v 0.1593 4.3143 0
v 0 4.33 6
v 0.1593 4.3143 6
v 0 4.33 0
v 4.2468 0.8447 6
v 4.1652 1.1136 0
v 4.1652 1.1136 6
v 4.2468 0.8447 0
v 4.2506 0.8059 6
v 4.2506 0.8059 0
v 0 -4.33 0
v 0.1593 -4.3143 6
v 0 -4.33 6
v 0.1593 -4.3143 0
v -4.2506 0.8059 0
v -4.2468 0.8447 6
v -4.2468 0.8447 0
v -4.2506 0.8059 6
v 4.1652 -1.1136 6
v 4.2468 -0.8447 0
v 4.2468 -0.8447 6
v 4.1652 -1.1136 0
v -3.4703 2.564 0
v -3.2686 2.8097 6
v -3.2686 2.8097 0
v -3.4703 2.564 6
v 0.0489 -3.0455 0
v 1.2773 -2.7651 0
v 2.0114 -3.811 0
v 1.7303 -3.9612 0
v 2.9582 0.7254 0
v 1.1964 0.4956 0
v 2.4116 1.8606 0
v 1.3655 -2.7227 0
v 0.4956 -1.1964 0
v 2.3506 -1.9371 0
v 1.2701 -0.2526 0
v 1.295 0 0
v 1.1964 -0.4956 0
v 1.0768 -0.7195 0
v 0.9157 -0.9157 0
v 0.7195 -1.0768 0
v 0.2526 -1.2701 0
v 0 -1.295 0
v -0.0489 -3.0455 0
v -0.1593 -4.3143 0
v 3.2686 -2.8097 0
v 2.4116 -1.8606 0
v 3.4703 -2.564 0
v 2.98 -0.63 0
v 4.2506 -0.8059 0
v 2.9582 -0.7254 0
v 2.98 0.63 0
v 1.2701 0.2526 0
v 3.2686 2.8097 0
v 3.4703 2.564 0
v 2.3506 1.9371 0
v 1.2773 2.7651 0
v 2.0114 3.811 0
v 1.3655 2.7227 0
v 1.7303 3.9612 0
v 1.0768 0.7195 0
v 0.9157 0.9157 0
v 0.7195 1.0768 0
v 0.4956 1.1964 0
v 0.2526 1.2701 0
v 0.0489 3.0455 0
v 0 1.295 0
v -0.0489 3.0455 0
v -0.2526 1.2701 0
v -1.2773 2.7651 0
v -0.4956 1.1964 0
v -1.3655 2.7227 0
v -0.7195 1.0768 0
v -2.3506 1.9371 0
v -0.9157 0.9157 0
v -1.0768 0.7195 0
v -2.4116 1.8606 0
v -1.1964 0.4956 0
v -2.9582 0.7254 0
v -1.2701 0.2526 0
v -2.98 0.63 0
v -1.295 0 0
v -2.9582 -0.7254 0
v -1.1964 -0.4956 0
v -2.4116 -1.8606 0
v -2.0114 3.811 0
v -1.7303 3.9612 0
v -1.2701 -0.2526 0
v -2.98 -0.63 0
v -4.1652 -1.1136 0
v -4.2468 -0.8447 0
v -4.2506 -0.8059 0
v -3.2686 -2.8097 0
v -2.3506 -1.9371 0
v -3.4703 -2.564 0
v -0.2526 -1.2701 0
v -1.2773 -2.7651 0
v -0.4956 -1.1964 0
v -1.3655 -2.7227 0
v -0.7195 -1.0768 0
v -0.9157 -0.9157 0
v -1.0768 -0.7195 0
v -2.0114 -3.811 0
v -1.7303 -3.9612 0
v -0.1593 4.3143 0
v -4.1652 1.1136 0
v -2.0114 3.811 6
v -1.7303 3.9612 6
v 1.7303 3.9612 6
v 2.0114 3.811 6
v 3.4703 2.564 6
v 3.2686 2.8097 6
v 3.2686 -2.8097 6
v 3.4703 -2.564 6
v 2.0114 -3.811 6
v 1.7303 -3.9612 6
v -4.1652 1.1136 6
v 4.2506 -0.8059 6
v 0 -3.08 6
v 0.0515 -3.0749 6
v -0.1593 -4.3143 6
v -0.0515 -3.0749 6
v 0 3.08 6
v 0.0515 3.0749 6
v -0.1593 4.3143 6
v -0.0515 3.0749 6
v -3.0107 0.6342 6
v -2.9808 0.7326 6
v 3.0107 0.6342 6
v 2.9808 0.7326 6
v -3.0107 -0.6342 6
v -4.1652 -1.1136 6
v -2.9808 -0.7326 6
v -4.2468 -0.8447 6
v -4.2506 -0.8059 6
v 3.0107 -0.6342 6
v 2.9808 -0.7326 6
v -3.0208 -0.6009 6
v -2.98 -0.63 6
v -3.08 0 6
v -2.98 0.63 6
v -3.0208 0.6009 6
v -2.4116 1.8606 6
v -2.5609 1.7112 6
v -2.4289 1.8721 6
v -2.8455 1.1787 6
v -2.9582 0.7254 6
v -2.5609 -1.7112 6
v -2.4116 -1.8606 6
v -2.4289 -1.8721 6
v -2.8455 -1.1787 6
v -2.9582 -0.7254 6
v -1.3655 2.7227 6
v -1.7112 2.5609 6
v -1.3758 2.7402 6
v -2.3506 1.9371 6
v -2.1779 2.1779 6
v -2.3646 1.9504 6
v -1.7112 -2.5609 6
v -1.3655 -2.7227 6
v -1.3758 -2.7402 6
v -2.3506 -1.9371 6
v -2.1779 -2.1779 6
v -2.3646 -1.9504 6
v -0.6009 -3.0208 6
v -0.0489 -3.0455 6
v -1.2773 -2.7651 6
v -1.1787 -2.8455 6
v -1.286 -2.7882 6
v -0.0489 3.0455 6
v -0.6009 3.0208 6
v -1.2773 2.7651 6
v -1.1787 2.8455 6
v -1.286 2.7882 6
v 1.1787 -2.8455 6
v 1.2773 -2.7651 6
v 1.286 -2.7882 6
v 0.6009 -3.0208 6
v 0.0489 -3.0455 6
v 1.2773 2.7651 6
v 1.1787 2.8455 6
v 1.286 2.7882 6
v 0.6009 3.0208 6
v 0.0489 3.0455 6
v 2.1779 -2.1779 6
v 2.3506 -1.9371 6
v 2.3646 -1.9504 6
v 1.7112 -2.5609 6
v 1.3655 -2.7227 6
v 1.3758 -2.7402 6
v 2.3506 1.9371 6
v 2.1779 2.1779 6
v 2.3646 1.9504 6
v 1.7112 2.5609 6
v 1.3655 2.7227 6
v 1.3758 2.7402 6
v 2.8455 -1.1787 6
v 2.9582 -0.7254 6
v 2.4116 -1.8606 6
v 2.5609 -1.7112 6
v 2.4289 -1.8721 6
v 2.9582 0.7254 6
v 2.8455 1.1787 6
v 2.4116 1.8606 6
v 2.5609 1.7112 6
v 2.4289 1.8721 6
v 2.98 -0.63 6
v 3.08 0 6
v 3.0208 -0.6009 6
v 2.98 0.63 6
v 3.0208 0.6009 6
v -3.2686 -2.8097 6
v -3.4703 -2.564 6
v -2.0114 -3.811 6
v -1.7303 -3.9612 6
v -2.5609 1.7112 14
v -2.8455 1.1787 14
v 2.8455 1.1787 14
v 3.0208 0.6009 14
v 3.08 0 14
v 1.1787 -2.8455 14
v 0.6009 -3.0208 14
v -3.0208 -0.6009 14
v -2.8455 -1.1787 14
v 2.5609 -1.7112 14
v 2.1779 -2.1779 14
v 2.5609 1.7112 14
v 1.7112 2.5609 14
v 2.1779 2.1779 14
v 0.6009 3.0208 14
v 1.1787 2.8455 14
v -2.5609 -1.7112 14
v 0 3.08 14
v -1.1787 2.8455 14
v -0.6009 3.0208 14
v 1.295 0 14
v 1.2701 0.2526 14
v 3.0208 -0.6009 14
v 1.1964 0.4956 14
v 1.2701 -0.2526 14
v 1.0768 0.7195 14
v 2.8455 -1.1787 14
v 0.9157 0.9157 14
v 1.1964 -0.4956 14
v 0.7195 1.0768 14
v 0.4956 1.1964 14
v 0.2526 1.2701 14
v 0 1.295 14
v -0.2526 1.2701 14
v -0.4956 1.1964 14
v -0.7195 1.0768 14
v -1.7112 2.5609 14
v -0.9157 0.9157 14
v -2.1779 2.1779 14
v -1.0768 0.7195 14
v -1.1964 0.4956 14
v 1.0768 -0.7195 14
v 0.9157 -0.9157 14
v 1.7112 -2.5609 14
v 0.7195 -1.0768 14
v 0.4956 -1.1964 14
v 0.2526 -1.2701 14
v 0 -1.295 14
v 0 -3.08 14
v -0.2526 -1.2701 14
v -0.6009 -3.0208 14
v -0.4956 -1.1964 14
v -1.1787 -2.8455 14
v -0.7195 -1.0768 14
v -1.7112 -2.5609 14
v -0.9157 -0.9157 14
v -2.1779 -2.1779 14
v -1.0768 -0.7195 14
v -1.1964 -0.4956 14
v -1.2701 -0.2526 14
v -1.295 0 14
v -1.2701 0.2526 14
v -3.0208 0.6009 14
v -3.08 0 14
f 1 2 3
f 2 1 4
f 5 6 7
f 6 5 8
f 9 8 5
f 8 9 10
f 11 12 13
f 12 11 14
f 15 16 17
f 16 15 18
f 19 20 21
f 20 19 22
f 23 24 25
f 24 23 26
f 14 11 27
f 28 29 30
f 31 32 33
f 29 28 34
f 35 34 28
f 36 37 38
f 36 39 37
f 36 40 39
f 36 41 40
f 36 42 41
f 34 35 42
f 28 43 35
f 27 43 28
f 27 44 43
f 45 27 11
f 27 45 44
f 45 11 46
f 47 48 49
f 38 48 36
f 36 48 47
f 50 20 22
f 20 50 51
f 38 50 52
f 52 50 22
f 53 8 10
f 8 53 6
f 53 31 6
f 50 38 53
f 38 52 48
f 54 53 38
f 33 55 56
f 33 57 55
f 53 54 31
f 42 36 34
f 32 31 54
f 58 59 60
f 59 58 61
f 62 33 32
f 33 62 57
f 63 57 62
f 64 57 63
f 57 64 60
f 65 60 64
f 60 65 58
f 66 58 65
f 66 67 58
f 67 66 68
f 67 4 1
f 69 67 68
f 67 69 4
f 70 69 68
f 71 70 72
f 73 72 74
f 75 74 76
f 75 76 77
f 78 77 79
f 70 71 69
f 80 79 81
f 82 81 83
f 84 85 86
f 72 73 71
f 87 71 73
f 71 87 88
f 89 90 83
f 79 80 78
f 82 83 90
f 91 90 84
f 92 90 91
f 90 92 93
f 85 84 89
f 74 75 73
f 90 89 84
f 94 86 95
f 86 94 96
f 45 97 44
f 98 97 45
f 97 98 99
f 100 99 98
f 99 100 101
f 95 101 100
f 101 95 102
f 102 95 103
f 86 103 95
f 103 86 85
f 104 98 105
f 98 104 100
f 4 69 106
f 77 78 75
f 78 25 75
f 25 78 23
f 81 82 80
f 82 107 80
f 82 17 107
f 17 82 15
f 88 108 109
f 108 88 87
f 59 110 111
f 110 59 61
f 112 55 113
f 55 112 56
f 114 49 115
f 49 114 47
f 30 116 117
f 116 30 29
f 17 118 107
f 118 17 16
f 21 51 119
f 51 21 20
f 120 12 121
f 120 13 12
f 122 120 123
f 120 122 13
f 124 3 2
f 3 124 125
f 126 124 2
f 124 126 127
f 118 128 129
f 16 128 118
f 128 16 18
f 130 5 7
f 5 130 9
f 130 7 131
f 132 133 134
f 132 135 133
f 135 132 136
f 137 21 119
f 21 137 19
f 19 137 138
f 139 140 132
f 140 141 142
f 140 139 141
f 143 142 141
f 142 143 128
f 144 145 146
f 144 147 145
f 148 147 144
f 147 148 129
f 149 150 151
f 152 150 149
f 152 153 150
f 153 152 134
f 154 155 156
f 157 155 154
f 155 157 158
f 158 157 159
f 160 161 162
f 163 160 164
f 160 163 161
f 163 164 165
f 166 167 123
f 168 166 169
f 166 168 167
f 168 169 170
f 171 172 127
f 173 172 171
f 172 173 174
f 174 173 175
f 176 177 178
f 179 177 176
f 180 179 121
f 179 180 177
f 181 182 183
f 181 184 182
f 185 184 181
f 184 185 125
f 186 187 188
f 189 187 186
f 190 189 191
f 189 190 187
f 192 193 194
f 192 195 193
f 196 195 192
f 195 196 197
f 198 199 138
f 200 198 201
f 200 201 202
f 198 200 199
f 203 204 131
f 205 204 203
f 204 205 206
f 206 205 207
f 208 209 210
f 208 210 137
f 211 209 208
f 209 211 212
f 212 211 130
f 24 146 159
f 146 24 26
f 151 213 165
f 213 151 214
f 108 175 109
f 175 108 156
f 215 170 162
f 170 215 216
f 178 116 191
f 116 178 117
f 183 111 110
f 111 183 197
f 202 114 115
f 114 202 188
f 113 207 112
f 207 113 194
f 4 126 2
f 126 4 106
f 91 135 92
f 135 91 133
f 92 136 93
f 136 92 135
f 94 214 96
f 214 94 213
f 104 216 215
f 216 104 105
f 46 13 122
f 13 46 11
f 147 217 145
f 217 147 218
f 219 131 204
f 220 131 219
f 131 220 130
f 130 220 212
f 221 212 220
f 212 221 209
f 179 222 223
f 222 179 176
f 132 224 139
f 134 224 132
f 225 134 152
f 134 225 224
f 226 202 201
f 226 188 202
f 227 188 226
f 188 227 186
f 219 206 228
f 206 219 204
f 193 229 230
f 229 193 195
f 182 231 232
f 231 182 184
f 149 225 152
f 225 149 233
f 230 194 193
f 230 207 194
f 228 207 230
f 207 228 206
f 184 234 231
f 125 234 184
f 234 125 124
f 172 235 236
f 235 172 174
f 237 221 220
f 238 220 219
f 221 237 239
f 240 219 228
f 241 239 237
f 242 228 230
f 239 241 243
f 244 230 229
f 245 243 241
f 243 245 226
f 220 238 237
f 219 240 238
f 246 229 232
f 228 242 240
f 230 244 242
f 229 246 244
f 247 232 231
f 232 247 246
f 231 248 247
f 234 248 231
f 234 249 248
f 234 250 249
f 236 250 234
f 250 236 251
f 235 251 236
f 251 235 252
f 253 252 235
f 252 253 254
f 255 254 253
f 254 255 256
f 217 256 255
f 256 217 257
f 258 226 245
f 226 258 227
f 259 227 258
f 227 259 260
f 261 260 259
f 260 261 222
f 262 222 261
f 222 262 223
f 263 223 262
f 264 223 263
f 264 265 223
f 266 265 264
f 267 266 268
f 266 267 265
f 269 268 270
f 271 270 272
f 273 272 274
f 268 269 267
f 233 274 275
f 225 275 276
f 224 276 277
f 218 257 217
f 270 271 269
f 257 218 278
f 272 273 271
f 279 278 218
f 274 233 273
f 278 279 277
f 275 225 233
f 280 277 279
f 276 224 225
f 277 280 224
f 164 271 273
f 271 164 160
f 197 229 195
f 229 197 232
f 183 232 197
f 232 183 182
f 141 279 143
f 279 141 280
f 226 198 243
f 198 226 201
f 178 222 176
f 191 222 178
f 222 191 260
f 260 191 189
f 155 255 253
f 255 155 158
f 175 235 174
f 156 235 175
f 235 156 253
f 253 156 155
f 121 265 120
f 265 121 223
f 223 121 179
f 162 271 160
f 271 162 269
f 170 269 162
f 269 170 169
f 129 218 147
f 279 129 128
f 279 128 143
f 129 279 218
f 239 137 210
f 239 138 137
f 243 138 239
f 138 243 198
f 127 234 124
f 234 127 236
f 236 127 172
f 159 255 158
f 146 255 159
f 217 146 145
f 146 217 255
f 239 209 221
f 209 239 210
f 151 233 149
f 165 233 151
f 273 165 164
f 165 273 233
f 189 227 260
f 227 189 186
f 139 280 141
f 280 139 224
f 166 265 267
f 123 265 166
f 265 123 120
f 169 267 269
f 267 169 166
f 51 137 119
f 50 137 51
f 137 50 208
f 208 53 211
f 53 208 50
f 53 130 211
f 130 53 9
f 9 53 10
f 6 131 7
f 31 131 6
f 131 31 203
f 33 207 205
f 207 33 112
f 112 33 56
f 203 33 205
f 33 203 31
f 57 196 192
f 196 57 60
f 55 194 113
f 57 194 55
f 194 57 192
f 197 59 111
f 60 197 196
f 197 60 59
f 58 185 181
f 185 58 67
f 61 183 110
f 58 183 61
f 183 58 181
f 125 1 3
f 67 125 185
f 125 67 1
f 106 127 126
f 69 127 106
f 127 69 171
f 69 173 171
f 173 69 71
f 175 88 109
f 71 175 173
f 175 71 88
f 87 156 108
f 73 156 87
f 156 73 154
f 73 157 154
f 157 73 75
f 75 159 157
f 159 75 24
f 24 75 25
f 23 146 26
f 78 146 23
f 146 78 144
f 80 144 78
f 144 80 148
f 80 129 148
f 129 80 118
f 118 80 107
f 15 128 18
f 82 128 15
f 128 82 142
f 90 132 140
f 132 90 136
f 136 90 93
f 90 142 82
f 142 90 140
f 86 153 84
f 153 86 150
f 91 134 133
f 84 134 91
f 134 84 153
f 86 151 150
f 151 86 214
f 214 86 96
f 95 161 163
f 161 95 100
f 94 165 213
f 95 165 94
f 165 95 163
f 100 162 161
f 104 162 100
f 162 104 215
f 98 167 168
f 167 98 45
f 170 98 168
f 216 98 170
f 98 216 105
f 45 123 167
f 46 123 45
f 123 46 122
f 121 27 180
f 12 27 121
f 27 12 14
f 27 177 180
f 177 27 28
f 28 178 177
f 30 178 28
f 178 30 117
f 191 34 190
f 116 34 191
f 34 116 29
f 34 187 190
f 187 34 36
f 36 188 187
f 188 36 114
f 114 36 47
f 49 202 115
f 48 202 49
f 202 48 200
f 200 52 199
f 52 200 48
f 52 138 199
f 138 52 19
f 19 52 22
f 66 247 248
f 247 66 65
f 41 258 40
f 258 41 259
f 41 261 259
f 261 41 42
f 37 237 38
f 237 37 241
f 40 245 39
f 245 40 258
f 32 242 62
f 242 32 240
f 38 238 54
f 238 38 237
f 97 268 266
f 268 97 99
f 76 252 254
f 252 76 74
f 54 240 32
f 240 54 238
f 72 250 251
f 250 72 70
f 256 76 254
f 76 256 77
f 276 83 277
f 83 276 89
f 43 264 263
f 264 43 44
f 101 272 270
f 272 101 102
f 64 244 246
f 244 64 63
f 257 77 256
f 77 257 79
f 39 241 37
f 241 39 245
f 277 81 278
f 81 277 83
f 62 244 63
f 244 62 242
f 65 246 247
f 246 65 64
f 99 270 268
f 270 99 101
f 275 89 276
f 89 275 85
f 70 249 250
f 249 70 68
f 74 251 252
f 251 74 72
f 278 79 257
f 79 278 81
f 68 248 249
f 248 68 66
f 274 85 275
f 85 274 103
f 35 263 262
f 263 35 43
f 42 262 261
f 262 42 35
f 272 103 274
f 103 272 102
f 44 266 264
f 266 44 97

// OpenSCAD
$fn = 32;

// ----------------------------------------------------------------------
// Timing pulley: GT2 14T, pitch 2 mm, 8.66 mm x 14 mm
// ----------------------------------------------------------------------

// --- parameters (mm) ---
pitch = 2;                // belt pitch
teeth = 14;               // number of grooves
belt_w = 6;               // belt width between the flanges
tip_d = 8.66;             // tip circle diameter
root_d = 7.16;            // groove bottom diameter
groove_h = 0.75;          // groove depth
tooth_w = 1.5;            // groove width at the tip circle
bore_d = 2.59;            // shaft bore
hub_d = 6.16;             // hub diameter
hub_h = 8;                // hub above the flange
bottom_z = 0;             // lowest point of the pulley
top_z = 14;               // highest point of the pulley

module rim() {
  cylinder(h = belt_w, d = tip_d);
}

module groove_cutter() {
  /* belt tooth groove: deeper than wide, cut through the belt width */
  translate([root_d / 2, 0, 0])
    linear_extrude(height = belt_w)
      polygon(points = [[-0.6, -tooth_w * 0.42], [groove_h + 0.6, -tooth_w * 0.6],
                        [groove_h + 0.6, tooth_w * 0.6], [-0.6, tooth_w * 0.42]]);
}

module hub() {
  translate([0, 0, bottom_z]) cylinder(h = top_z - bottom_z, d = hub_d);
}

difference() {
  union() {
    rim();
    hub();
  }
  for (i = [0 : teeth - 1]) rotate([0, 0, i * 360 / teeth]) groove_cutter();
  translate([0, 0, bottom_z - 1]) cylinder(h = top_z - bottom_z + 2, d = bore_d);
}
